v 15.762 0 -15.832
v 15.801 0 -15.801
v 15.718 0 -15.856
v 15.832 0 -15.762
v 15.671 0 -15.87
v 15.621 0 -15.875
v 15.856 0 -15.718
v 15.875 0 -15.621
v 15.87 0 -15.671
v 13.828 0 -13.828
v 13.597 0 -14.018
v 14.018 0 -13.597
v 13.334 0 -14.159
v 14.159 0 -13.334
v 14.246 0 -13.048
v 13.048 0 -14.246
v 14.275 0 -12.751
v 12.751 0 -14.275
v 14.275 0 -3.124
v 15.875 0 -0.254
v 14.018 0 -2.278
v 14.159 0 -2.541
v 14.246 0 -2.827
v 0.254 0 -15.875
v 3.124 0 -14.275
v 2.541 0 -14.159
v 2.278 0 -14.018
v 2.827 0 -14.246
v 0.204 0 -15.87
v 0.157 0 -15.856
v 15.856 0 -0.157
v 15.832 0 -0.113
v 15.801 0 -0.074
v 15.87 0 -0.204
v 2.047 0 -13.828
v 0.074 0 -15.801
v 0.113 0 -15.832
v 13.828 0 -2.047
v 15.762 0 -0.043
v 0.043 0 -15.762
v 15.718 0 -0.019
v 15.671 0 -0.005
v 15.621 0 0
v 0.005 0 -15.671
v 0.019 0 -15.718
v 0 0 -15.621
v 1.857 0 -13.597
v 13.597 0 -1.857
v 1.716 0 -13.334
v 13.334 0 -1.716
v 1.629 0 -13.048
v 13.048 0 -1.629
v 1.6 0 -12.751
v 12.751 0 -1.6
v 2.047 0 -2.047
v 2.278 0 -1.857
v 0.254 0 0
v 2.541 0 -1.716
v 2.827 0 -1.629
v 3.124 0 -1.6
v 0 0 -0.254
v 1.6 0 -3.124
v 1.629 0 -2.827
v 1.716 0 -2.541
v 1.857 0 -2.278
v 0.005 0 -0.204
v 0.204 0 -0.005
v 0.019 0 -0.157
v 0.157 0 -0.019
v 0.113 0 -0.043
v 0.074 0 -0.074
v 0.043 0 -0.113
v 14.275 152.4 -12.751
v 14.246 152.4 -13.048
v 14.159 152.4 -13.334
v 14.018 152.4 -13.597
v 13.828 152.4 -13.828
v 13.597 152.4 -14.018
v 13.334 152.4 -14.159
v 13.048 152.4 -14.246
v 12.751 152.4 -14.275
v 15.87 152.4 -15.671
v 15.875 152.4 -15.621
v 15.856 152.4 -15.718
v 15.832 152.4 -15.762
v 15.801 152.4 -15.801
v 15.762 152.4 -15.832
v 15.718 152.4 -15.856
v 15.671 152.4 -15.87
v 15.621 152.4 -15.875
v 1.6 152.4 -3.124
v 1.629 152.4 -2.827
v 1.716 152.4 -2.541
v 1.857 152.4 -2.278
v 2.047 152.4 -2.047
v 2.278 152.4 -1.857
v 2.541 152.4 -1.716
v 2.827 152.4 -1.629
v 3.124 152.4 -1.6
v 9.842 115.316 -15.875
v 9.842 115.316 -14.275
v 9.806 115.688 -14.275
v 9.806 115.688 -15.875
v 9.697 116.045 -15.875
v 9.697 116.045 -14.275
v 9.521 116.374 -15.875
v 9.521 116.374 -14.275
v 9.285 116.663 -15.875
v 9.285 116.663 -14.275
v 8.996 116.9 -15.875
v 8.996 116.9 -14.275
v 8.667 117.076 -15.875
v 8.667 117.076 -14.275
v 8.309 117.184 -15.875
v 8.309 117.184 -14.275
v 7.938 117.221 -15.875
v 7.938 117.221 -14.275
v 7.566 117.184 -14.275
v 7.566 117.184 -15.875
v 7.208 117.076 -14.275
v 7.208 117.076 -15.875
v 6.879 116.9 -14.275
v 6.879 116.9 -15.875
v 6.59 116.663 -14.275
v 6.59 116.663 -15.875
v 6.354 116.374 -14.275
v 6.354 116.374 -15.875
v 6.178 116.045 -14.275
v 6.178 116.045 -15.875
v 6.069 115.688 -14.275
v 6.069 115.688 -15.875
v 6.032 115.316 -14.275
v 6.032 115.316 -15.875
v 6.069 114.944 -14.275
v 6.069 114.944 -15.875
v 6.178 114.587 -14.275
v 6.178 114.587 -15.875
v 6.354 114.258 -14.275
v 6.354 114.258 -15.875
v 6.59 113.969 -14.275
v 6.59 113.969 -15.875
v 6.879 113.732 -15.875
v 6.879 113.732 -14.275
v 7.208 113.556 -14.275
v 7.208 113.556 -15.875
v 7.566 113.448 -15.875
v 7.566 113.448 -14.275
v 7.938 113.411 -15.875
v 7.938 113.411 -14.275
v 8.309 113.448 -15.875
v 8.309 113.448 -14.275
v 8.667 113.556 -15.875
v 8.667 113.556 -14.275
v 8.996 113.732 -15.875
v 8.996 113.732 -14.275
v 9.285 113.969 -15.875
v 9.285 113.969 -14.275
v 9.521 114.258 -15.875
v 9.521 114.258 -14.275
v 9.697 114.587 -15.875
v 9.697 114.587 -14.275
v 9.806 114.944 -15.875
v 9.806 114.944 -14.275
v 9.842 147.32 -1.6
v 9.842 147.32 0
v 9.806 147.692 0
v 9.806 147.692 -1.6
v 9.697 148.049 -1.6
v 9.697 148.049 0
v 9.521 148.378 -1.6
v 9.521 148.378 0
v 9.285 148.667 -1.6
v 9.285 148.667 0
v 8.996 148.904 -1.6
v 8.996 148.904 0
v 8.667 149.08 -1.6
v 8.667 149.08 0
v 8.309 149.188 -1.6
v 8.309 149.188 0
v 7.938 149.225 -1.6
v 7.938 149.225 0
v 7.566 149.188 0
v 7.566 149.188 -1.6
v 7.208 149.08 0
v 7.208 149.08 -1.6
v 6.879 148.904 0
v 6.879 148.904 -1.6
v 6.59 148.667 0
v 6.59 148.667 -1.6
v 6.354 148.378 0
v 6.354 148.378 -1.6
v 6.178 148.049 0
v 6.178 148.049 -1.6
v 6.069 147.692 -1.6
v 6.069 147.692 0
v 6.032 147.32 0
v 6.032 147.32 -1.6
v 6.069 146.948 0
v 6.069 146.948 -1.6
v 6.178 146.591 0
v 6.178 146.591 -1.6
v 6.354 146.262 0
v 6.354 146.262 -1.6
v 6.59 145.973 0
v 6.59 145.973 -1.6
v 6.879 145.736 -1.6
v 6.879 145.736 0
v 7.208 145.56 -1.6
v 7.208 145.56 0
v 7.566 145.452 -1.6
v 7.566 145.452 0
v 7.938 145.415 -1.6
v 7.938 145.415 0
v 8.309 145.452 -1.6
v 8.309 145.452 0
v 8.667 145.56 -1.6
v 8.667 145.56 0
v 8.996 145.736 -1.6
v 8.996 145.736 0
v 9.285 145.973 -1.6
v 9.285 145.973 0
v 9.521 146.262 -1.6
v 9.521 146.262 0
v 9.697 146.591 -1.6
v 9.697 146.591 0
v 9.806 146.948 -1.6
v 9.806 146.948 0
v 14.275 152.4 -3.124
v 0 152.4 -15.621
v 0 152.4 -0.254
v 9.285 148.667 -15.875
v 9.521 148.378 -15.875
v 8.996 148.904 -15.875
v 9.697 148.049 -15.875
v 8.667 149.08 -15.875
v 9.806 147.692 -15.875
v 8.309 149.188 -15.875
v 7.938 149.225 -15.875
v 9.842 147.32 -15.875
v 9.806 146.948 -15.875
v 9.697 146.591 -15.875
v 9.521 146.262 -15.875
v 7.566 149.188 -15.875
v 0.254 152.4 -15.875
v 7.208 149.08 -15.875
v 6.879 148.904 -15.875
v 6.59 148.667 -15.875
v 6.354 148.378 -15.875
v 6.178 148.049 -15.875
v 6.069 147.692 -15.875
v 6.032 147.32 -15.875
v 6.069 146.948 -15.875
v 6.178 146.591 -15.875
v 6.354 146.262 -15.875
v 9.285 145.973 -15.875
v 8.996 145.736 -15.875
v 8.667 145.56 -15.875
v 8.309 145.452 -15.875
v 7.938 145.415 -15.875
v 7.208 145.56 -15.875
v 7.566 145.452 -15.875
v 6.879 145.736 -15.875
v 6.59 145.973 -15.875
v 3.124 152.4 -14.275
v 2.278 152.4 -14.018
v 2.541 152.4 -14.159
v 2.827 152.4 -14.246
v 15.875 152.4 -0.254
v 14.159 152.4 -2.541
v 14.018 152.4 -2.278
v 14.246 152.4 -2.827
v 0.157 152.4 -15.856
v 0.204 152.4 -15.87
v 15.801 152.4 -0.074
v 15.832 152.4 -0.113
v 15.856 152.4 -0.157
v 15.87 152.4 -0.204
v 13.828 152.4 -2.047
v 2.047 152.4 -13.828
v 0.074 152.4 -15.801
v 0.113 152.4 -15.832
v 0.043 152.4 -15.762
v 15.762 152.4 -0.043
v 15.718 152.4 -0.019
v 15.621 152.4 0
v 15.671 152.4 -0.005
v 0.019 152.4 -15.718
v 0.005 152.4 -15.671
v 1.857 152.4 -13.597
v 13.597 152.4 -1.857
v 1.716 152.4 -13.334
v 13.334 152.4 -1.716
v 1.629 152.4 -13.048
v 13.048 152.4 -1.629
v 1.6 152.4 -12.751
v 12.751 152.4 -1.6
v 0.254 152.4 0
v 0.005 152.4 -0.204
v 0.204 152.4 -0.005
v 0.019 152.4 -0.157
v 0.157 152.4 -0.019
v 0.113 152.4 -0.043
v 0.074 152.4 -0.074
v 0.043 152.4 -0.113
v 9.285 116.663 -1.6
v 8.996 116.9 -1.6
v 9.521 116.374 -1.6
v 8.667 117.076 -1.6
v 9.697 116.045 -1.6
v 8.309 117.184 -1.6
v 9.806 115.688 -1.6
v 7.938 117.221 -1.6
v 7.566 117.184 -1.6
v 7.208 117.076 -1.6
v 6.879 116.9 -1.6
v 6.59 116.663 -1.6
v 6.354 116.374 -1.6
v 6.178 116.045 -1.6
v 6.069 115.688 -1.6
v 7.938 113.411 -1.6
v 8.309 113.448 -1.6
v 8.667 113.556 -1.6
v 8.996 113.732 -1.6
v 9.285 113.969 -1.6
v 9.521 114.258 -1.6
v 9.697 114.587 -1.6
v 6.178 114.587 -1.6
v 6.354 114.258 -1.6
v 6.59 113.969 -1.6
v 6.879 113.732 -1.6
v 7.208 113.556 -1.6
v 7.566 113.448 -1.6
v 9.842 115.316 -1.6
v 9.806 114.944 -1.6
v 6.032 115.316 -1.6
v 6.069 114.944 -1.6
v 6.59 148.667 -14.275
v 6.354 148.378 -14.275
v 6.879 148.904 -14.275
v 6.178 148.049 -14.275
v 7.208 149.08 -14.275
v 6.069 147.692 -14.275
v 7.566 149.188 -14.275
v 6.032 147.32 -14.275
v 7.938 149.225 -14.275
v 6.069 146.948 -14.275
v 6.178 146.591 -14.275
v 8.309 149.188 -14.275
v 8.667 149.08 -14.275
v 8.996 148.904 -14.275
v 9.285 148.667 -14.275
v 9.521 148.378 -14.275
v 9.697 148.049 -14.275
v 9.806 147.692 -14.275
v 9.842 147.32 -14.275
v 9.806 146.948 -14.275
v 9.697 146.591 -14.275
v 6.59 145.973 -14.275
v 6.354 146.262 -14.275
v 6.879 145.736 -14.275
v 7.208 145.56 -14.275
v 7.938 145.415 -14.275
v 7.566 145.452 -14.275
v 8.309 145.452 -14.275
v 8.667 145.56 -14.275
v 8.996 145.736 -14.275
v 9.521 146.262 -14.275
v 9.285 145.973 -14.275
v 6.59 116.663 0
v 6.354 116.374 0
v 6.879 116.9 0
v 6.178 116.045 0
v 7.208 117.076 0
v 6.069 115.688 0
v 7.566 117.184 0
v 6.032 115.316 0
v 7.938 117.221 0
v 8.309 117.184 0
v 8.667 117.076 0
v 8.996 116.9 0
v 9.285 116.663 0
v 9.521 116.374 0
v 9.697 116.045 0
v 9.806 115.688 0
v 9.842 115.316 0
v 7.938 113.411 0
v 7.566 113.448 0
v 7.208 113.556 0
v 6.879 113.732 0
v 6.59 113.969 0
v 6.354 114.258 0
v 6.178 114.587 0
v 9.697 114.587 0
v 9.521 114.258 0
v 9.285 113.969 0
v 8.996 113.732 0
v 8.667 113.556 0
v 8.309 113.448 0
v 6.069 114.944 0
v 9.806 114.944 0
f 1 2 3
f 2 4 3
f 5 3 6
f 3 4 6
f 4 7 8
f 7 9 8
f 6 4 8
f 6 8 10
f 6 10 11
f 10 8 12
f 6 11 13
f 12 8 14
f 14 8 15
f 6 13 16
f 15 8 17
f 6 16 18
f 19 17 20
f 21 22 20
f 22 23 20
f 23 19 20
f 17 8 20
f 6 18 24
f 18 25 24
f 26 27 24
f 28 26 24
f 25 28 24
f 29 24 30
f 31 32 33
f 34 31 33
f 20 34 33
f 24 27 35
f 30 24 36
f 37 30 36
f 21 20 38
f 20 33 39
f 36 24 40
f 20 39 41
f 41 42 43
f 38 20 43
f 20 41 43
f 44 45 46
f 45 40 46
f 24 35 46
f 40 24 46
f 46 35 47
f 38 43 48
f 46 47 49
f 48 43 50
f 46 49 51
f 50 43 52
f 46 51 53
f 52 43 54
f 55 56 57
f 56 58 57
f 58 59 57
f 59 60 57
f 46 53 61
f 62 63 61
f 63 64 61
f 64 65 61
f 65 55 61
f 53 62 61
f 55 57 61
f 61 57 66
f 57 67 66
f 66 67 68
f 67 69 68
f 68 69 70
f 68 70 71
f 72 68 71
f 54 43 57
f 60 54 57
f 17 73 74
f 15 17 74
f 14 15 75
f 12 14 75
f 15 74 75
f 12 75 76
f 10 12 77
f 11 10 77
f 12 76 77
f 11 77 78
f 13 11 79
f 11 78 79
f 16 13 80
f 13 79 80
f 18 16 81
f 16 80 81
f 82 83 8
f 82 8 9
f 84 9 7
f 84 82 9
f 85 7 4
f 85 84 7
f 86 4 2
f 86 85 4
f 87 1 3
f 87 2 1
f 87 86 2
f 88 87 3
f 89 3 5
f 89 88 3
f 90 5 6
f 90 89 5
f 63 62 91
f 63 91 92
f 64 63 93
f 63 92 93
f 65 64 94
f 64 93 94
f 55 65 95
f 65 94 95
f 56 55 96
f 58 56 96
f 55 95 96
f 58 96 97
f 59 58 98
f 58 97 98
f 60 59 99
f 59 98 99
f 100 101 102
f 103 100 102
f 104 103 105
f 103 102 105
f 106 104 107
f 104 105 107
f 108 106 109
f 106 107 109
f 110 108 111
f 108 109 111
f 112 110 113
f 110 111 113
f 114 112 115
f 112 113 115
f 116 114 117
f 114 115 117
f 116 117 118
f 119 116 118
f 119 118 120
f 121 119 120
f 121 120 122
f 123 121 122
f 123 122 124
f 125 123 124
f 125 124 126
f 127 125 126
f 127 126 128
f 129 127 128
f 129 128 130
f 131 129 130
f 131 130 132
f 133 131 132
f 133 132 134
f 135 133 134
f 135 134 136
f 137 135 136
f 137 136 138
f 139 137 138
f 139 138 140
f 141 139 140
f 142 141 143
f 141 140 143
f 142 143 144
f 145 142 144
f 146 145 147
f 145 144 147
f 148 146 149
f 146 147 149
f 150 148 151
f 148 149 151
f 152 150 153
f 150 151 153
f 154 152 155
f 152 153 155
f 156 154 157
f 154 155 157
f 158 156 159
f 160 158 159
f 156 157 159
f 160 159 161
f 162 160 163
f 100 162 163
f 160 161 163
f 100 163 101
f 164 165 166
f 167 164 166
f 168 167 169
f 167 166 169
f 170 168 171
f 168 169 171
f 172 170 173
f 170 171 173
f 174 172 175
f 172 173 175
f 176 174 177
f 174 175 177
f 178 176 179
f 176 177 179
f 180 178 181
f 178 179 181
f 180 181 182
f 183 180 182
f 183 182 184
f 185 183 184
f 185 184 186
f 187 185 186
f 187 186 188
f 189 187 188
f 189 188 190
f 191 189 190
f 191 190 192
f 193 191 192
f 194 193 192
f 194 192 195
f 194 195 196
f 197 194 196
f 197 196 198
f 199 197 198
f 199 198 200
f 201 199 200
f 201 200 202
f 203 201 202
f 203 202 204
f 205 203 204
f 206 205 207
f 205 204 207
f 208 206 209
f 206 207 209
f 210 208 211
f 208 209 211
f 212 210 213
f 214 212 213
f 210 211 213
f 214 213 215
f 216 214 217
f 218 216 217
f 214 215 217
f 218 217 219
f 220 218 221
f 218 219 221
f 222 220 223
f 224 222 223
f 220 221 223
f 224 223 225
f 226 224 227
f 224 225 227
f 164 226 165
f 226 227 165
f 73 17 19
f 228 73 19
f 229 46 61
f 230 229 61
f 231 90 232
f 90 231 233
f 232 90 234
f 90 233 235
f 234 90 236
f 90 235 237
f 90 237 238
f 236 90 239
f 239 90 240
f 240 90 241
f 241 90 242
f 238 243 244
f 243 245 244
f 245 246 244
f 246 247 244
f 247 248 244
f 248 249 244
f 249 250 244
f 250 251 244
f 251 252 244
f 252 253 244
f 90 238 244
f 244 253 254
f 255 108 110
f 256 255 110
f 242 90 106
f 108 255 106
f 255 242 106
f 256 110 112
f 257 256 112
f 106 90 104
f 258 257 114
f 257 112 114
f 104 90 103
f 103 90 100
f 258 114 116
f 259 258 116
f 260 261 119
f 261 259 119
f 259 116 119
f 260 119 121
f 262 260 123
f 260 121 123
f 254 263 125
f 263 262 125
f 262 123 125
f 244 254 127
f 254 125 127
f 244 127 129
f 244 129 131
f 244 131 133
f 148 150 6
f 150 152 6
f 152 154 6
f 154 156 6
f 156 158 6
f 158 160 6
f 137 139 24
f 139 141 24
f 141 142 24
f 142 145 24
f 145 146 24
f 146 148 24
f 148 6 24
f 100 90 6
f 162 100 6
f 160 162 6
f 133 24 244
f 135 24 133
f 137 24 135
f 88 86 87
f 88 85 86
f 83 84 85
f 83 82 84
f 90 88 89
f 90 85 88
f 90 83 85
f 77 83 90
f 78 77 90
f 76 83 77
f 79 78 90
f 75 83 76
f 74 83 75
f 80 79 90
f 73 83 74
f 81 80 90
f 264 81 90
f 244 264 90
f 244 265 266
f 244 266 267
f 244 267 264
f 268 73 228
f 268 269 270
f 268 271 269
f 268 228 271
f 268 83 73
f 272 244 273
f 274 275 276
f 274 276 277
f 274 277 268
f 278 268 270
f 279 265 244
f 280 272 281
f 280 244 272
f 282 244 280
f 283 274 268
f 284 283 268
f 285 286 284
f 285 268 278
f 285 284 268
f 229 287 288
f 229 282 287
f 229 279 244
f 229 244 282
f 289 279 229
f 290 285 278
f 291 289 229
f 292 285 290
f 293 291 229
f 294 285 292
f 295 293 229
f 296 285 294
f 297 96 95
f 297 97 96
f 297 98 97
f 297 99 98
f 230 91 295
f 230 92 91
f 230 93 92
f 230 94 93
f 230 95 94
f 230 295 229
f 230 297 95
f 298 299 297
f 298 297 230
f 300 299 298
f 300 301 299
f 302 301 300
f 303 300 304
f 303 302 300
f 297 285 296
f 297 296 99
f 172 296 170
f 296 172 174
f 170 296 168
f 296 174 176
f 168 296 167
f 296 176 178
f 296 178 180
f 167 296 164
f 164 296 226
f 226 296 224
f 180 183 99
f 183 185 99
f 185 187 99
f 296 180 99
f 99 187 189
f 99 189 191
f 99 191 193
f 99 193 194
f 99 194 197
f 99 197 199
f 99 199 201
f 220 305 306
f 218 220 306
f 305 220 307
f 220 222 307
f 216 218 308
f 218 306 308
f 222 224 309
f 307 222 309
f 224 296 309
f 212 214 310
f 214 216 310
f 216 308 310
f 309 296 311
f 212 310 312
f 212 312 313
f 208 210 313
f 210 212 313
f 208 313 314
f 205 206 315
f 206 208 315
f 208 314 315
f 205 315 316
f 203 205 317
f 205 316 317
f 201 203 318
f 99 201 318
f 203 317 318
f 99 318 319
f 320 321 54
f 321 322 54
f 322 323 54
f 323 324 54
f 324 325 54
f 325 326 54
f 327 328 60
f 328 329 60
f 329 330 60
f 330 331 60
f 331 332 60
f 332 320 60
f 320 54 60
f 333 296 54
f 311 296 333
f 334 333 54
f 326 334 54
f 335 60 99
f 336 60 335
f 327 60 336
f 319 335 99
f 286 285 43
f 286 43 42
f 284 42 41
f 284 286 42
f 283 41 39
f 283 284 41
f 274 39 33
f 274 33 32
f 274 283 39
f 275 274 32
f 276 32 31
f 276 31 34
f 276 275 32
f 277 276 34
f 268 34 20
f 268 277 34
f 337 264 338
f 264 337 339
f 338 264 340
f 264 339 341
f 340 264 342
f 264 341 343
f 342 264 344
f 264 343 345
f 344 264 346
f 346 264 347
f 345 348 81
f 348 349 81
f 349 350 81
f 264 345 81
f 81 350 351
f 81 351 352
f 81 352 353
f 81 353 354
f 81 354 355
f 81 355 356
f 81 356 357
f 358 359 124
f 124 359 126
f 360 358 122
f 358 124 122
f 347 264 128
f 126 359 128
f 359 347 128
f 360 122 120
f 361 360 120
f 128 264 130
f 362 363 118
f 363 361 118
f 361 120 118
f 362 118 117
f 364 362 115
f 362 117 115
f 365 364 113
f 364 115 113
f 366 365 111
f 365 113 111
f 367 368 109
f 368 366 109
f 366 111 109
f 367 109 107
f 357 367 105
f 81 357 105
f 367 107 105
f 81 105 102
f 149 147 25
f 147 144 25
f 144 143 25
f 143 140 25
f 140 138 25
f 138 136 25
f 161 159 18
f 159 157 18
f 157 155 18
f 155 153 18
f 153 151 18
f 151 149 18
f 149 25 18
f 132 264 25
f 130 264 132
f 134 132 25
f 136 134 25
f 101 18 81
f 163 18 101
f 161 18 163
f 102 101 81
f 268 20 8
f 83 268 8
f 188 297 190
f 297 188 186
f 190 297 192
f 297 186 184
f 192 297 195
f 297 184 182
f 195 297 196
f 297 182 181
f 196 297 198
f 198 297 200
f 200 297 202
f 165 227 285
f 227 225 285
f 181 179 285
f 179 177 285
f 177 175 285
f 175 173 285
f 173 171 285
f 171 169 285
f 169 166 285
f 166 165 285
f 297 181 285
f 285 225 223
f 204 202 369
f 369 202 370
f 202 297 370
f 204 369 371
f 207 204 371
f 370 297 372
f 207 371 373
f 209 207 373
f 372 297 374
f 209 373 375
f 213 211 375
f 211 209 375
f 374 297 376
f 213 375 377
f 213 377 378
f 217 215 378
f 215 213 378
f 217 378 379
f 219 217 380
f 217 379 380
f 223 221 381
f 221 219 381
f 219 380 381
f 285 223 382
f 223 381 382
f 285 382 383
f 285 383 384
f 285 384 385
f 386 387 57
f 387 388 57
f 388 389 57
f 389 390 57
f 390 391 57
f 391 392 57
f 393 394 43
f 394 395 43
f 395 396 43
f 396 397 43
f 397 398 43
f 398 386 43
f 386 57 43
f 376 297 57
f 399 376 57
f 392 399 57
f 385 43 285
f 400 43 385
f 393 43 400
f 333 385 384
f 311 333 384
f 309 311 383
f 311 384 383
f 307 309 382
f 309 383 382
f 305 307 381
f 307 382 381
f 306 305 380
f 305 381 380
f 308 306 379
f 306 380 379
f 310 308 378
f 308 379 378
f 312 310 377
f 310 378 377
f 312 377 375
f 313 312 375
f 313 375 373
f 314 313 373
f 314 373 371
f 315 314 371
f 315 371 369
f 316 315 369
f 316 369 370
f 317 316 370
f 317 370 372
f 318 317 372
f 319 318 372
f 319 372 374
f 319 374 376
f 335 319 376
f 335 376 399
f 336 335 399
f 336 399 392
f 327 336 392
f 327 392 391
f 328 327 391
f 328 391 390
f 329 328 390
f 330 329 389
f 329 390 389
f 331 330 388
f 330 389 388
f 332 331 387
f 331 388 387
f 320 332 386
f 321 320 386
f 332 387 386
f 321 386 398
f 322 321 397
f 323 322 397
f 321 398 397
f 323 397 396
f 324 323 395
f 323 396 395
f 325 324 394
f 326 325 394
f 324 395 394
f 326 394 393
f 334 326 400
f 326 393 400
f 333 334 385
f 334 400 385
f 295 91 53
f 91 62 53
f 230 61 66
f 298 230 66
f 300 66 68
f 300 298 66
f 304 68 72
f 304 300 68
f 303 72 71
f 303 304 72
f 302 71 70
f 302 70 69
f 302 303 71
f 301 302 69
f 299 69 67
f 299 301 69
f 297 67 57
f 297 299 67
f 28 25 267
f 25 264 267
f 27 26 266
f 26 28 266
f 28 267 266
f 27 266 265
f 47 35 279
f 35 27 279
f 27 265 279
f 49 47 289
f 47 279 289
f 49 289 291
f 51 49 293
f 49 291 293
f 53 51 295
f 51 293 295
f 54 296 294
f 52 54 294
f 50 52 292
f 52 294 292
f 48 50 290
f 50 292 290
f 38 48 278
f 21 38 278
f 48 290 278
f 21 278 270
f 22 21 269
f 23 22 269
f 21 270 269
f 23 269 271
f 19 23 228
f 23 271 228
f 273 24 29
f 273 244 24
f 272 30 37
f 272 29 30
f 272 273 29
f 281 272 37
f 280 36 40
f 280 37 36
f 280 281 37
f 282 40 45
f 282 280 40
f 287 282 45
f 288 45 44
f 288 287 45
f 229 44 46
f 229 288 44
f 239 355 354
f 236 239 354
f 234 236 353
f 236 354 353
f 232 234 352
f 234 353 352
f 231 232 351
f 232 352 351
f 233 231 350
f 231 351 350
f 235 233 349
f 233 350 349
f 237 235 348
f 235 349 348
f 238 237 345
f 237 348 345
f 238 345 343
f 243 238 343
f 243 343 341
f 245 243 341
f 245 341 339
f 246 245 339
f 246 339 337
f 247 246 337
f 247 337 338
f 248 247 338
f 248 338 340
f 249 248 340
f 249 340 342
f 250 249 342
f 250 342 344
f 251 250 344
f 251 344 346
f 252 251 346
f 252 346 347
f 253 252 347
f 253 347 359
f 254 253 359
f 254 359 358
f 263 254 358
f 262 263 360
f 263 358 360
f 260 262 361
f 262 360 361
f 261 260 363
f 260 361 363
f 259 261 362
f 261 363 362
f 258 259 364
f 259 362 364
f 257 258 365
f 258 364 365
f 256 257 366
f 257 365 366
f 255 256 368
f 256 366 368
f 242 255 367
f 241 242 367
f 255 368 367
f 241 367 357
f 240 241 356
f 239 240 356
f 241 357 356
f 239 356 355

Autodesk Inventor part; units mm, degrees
ref_plane "YZ Plane" through (0, 0, 0) normal (1, 0, 0) x (0, 1, 0)
ref_plane "XZ Plane" through (0, 0, 0) normal (0, 1, 0) x (-1, 0, 0)
ref_plane "XY Plane" through (0, 0, 0) normal (0, 0, 1) x (1, 0, 0)
sketch "Sketch1" plane through (0, 0, 0) normal (0, 1, 0) x (-1, 0, 0)
  line L0 (0, 0) -> (-15.875, 0)
  line L1 (-15.875, 0) -> (-15.875, -15.875)
  line L2 (-15.875, -15.875) -> (0, -15.875)
  line L3 (0, -15.875) -> (0, 0)
  dimension "d0" = 15.875
  dimension "d1" = 15.875
extrude "Extrusion1" add sketch "Sketch1" along normal blind 152.4
sketch "Sketch2" plane through (0, 0, 0) normal (0, -1, 0) x (1, 0, 0)
  line L0 (15.875, 0) -> (15.875, -15.875) projected
  line L1 (0, 0) -> (15.875, 0) projected
  line L2 (0, -15.875) -> (0, 0) projected
  line L3 (15.875, -15.875) -> (0, -15.875) projected
  line L4 (14.2748, -14.2748) -> (14.2748, -1.6002)
  line L5 (14.2748, -1.6002) -> (1.6002, -1.6002)
  line L6 (1.6002, -1.6002) -> (1.6002, -14.2748)
  line L7 (1.6002, -14.2748) -> (14.2748, -14.2748)
  dimension "d4" = 1.6002
extrude "Extrusion2" cut sketch "Sketch2" against normal blind 152.4 contours L7 L6 L5 L4
fillet "Fillet1" radius 1.524 4 edges at (14.2748, 76.2, -14.2748) (1.6002, 76.2, -1.6002) (14.2748, 76.2, -1.6002) (1.6002, 76.2, -14.2748)
fillet "Fillet2" radius 0.254 4 edges at (15.875, 76.2, 0) (15.875, 76.2, -15.875) (0, 76.2, -15.875) (0, 76.2, 0)
sketch "Sketch3" plane through (0.254, 0, 0) normal (0, 0, 1) x (1, 0, 0)
  line L0 (15.367, 152.4) -> (0, 152.4) projected
  line L1 (7.6835, 152.4) -> (7.6835, 147.32)
  circle A0 centre (7.6835, 147.32) radius 1.905
  point P0 (-0.254, 0)
  dimension "d9" = 5.08
  dimension "d10" = 3.81
extrude "Extrusion3" cut sketch "Sketch3" against normal blind 15.875
sketch "Sketch4" plane through (0.254, 0, 0) normal (0, 0, 1) x (1, 0, 0)
  circle A0 centre (7.6835, 147.32) radius 1.905 projected
  line L0 (7.6835, 147.32) -> (7.6835, 117.221)
  circle A1 centre (7.6835, 115.316) radius 1.905
  point P0 (-0.254, 0)
  dimension "d13" = 30.099
extrude "Extrusion4" cut sketch "Sketch4" against normal blind 15.875 contours A1
properties part number "am-3594 5-8x5-8 0.063 wall tubing"
